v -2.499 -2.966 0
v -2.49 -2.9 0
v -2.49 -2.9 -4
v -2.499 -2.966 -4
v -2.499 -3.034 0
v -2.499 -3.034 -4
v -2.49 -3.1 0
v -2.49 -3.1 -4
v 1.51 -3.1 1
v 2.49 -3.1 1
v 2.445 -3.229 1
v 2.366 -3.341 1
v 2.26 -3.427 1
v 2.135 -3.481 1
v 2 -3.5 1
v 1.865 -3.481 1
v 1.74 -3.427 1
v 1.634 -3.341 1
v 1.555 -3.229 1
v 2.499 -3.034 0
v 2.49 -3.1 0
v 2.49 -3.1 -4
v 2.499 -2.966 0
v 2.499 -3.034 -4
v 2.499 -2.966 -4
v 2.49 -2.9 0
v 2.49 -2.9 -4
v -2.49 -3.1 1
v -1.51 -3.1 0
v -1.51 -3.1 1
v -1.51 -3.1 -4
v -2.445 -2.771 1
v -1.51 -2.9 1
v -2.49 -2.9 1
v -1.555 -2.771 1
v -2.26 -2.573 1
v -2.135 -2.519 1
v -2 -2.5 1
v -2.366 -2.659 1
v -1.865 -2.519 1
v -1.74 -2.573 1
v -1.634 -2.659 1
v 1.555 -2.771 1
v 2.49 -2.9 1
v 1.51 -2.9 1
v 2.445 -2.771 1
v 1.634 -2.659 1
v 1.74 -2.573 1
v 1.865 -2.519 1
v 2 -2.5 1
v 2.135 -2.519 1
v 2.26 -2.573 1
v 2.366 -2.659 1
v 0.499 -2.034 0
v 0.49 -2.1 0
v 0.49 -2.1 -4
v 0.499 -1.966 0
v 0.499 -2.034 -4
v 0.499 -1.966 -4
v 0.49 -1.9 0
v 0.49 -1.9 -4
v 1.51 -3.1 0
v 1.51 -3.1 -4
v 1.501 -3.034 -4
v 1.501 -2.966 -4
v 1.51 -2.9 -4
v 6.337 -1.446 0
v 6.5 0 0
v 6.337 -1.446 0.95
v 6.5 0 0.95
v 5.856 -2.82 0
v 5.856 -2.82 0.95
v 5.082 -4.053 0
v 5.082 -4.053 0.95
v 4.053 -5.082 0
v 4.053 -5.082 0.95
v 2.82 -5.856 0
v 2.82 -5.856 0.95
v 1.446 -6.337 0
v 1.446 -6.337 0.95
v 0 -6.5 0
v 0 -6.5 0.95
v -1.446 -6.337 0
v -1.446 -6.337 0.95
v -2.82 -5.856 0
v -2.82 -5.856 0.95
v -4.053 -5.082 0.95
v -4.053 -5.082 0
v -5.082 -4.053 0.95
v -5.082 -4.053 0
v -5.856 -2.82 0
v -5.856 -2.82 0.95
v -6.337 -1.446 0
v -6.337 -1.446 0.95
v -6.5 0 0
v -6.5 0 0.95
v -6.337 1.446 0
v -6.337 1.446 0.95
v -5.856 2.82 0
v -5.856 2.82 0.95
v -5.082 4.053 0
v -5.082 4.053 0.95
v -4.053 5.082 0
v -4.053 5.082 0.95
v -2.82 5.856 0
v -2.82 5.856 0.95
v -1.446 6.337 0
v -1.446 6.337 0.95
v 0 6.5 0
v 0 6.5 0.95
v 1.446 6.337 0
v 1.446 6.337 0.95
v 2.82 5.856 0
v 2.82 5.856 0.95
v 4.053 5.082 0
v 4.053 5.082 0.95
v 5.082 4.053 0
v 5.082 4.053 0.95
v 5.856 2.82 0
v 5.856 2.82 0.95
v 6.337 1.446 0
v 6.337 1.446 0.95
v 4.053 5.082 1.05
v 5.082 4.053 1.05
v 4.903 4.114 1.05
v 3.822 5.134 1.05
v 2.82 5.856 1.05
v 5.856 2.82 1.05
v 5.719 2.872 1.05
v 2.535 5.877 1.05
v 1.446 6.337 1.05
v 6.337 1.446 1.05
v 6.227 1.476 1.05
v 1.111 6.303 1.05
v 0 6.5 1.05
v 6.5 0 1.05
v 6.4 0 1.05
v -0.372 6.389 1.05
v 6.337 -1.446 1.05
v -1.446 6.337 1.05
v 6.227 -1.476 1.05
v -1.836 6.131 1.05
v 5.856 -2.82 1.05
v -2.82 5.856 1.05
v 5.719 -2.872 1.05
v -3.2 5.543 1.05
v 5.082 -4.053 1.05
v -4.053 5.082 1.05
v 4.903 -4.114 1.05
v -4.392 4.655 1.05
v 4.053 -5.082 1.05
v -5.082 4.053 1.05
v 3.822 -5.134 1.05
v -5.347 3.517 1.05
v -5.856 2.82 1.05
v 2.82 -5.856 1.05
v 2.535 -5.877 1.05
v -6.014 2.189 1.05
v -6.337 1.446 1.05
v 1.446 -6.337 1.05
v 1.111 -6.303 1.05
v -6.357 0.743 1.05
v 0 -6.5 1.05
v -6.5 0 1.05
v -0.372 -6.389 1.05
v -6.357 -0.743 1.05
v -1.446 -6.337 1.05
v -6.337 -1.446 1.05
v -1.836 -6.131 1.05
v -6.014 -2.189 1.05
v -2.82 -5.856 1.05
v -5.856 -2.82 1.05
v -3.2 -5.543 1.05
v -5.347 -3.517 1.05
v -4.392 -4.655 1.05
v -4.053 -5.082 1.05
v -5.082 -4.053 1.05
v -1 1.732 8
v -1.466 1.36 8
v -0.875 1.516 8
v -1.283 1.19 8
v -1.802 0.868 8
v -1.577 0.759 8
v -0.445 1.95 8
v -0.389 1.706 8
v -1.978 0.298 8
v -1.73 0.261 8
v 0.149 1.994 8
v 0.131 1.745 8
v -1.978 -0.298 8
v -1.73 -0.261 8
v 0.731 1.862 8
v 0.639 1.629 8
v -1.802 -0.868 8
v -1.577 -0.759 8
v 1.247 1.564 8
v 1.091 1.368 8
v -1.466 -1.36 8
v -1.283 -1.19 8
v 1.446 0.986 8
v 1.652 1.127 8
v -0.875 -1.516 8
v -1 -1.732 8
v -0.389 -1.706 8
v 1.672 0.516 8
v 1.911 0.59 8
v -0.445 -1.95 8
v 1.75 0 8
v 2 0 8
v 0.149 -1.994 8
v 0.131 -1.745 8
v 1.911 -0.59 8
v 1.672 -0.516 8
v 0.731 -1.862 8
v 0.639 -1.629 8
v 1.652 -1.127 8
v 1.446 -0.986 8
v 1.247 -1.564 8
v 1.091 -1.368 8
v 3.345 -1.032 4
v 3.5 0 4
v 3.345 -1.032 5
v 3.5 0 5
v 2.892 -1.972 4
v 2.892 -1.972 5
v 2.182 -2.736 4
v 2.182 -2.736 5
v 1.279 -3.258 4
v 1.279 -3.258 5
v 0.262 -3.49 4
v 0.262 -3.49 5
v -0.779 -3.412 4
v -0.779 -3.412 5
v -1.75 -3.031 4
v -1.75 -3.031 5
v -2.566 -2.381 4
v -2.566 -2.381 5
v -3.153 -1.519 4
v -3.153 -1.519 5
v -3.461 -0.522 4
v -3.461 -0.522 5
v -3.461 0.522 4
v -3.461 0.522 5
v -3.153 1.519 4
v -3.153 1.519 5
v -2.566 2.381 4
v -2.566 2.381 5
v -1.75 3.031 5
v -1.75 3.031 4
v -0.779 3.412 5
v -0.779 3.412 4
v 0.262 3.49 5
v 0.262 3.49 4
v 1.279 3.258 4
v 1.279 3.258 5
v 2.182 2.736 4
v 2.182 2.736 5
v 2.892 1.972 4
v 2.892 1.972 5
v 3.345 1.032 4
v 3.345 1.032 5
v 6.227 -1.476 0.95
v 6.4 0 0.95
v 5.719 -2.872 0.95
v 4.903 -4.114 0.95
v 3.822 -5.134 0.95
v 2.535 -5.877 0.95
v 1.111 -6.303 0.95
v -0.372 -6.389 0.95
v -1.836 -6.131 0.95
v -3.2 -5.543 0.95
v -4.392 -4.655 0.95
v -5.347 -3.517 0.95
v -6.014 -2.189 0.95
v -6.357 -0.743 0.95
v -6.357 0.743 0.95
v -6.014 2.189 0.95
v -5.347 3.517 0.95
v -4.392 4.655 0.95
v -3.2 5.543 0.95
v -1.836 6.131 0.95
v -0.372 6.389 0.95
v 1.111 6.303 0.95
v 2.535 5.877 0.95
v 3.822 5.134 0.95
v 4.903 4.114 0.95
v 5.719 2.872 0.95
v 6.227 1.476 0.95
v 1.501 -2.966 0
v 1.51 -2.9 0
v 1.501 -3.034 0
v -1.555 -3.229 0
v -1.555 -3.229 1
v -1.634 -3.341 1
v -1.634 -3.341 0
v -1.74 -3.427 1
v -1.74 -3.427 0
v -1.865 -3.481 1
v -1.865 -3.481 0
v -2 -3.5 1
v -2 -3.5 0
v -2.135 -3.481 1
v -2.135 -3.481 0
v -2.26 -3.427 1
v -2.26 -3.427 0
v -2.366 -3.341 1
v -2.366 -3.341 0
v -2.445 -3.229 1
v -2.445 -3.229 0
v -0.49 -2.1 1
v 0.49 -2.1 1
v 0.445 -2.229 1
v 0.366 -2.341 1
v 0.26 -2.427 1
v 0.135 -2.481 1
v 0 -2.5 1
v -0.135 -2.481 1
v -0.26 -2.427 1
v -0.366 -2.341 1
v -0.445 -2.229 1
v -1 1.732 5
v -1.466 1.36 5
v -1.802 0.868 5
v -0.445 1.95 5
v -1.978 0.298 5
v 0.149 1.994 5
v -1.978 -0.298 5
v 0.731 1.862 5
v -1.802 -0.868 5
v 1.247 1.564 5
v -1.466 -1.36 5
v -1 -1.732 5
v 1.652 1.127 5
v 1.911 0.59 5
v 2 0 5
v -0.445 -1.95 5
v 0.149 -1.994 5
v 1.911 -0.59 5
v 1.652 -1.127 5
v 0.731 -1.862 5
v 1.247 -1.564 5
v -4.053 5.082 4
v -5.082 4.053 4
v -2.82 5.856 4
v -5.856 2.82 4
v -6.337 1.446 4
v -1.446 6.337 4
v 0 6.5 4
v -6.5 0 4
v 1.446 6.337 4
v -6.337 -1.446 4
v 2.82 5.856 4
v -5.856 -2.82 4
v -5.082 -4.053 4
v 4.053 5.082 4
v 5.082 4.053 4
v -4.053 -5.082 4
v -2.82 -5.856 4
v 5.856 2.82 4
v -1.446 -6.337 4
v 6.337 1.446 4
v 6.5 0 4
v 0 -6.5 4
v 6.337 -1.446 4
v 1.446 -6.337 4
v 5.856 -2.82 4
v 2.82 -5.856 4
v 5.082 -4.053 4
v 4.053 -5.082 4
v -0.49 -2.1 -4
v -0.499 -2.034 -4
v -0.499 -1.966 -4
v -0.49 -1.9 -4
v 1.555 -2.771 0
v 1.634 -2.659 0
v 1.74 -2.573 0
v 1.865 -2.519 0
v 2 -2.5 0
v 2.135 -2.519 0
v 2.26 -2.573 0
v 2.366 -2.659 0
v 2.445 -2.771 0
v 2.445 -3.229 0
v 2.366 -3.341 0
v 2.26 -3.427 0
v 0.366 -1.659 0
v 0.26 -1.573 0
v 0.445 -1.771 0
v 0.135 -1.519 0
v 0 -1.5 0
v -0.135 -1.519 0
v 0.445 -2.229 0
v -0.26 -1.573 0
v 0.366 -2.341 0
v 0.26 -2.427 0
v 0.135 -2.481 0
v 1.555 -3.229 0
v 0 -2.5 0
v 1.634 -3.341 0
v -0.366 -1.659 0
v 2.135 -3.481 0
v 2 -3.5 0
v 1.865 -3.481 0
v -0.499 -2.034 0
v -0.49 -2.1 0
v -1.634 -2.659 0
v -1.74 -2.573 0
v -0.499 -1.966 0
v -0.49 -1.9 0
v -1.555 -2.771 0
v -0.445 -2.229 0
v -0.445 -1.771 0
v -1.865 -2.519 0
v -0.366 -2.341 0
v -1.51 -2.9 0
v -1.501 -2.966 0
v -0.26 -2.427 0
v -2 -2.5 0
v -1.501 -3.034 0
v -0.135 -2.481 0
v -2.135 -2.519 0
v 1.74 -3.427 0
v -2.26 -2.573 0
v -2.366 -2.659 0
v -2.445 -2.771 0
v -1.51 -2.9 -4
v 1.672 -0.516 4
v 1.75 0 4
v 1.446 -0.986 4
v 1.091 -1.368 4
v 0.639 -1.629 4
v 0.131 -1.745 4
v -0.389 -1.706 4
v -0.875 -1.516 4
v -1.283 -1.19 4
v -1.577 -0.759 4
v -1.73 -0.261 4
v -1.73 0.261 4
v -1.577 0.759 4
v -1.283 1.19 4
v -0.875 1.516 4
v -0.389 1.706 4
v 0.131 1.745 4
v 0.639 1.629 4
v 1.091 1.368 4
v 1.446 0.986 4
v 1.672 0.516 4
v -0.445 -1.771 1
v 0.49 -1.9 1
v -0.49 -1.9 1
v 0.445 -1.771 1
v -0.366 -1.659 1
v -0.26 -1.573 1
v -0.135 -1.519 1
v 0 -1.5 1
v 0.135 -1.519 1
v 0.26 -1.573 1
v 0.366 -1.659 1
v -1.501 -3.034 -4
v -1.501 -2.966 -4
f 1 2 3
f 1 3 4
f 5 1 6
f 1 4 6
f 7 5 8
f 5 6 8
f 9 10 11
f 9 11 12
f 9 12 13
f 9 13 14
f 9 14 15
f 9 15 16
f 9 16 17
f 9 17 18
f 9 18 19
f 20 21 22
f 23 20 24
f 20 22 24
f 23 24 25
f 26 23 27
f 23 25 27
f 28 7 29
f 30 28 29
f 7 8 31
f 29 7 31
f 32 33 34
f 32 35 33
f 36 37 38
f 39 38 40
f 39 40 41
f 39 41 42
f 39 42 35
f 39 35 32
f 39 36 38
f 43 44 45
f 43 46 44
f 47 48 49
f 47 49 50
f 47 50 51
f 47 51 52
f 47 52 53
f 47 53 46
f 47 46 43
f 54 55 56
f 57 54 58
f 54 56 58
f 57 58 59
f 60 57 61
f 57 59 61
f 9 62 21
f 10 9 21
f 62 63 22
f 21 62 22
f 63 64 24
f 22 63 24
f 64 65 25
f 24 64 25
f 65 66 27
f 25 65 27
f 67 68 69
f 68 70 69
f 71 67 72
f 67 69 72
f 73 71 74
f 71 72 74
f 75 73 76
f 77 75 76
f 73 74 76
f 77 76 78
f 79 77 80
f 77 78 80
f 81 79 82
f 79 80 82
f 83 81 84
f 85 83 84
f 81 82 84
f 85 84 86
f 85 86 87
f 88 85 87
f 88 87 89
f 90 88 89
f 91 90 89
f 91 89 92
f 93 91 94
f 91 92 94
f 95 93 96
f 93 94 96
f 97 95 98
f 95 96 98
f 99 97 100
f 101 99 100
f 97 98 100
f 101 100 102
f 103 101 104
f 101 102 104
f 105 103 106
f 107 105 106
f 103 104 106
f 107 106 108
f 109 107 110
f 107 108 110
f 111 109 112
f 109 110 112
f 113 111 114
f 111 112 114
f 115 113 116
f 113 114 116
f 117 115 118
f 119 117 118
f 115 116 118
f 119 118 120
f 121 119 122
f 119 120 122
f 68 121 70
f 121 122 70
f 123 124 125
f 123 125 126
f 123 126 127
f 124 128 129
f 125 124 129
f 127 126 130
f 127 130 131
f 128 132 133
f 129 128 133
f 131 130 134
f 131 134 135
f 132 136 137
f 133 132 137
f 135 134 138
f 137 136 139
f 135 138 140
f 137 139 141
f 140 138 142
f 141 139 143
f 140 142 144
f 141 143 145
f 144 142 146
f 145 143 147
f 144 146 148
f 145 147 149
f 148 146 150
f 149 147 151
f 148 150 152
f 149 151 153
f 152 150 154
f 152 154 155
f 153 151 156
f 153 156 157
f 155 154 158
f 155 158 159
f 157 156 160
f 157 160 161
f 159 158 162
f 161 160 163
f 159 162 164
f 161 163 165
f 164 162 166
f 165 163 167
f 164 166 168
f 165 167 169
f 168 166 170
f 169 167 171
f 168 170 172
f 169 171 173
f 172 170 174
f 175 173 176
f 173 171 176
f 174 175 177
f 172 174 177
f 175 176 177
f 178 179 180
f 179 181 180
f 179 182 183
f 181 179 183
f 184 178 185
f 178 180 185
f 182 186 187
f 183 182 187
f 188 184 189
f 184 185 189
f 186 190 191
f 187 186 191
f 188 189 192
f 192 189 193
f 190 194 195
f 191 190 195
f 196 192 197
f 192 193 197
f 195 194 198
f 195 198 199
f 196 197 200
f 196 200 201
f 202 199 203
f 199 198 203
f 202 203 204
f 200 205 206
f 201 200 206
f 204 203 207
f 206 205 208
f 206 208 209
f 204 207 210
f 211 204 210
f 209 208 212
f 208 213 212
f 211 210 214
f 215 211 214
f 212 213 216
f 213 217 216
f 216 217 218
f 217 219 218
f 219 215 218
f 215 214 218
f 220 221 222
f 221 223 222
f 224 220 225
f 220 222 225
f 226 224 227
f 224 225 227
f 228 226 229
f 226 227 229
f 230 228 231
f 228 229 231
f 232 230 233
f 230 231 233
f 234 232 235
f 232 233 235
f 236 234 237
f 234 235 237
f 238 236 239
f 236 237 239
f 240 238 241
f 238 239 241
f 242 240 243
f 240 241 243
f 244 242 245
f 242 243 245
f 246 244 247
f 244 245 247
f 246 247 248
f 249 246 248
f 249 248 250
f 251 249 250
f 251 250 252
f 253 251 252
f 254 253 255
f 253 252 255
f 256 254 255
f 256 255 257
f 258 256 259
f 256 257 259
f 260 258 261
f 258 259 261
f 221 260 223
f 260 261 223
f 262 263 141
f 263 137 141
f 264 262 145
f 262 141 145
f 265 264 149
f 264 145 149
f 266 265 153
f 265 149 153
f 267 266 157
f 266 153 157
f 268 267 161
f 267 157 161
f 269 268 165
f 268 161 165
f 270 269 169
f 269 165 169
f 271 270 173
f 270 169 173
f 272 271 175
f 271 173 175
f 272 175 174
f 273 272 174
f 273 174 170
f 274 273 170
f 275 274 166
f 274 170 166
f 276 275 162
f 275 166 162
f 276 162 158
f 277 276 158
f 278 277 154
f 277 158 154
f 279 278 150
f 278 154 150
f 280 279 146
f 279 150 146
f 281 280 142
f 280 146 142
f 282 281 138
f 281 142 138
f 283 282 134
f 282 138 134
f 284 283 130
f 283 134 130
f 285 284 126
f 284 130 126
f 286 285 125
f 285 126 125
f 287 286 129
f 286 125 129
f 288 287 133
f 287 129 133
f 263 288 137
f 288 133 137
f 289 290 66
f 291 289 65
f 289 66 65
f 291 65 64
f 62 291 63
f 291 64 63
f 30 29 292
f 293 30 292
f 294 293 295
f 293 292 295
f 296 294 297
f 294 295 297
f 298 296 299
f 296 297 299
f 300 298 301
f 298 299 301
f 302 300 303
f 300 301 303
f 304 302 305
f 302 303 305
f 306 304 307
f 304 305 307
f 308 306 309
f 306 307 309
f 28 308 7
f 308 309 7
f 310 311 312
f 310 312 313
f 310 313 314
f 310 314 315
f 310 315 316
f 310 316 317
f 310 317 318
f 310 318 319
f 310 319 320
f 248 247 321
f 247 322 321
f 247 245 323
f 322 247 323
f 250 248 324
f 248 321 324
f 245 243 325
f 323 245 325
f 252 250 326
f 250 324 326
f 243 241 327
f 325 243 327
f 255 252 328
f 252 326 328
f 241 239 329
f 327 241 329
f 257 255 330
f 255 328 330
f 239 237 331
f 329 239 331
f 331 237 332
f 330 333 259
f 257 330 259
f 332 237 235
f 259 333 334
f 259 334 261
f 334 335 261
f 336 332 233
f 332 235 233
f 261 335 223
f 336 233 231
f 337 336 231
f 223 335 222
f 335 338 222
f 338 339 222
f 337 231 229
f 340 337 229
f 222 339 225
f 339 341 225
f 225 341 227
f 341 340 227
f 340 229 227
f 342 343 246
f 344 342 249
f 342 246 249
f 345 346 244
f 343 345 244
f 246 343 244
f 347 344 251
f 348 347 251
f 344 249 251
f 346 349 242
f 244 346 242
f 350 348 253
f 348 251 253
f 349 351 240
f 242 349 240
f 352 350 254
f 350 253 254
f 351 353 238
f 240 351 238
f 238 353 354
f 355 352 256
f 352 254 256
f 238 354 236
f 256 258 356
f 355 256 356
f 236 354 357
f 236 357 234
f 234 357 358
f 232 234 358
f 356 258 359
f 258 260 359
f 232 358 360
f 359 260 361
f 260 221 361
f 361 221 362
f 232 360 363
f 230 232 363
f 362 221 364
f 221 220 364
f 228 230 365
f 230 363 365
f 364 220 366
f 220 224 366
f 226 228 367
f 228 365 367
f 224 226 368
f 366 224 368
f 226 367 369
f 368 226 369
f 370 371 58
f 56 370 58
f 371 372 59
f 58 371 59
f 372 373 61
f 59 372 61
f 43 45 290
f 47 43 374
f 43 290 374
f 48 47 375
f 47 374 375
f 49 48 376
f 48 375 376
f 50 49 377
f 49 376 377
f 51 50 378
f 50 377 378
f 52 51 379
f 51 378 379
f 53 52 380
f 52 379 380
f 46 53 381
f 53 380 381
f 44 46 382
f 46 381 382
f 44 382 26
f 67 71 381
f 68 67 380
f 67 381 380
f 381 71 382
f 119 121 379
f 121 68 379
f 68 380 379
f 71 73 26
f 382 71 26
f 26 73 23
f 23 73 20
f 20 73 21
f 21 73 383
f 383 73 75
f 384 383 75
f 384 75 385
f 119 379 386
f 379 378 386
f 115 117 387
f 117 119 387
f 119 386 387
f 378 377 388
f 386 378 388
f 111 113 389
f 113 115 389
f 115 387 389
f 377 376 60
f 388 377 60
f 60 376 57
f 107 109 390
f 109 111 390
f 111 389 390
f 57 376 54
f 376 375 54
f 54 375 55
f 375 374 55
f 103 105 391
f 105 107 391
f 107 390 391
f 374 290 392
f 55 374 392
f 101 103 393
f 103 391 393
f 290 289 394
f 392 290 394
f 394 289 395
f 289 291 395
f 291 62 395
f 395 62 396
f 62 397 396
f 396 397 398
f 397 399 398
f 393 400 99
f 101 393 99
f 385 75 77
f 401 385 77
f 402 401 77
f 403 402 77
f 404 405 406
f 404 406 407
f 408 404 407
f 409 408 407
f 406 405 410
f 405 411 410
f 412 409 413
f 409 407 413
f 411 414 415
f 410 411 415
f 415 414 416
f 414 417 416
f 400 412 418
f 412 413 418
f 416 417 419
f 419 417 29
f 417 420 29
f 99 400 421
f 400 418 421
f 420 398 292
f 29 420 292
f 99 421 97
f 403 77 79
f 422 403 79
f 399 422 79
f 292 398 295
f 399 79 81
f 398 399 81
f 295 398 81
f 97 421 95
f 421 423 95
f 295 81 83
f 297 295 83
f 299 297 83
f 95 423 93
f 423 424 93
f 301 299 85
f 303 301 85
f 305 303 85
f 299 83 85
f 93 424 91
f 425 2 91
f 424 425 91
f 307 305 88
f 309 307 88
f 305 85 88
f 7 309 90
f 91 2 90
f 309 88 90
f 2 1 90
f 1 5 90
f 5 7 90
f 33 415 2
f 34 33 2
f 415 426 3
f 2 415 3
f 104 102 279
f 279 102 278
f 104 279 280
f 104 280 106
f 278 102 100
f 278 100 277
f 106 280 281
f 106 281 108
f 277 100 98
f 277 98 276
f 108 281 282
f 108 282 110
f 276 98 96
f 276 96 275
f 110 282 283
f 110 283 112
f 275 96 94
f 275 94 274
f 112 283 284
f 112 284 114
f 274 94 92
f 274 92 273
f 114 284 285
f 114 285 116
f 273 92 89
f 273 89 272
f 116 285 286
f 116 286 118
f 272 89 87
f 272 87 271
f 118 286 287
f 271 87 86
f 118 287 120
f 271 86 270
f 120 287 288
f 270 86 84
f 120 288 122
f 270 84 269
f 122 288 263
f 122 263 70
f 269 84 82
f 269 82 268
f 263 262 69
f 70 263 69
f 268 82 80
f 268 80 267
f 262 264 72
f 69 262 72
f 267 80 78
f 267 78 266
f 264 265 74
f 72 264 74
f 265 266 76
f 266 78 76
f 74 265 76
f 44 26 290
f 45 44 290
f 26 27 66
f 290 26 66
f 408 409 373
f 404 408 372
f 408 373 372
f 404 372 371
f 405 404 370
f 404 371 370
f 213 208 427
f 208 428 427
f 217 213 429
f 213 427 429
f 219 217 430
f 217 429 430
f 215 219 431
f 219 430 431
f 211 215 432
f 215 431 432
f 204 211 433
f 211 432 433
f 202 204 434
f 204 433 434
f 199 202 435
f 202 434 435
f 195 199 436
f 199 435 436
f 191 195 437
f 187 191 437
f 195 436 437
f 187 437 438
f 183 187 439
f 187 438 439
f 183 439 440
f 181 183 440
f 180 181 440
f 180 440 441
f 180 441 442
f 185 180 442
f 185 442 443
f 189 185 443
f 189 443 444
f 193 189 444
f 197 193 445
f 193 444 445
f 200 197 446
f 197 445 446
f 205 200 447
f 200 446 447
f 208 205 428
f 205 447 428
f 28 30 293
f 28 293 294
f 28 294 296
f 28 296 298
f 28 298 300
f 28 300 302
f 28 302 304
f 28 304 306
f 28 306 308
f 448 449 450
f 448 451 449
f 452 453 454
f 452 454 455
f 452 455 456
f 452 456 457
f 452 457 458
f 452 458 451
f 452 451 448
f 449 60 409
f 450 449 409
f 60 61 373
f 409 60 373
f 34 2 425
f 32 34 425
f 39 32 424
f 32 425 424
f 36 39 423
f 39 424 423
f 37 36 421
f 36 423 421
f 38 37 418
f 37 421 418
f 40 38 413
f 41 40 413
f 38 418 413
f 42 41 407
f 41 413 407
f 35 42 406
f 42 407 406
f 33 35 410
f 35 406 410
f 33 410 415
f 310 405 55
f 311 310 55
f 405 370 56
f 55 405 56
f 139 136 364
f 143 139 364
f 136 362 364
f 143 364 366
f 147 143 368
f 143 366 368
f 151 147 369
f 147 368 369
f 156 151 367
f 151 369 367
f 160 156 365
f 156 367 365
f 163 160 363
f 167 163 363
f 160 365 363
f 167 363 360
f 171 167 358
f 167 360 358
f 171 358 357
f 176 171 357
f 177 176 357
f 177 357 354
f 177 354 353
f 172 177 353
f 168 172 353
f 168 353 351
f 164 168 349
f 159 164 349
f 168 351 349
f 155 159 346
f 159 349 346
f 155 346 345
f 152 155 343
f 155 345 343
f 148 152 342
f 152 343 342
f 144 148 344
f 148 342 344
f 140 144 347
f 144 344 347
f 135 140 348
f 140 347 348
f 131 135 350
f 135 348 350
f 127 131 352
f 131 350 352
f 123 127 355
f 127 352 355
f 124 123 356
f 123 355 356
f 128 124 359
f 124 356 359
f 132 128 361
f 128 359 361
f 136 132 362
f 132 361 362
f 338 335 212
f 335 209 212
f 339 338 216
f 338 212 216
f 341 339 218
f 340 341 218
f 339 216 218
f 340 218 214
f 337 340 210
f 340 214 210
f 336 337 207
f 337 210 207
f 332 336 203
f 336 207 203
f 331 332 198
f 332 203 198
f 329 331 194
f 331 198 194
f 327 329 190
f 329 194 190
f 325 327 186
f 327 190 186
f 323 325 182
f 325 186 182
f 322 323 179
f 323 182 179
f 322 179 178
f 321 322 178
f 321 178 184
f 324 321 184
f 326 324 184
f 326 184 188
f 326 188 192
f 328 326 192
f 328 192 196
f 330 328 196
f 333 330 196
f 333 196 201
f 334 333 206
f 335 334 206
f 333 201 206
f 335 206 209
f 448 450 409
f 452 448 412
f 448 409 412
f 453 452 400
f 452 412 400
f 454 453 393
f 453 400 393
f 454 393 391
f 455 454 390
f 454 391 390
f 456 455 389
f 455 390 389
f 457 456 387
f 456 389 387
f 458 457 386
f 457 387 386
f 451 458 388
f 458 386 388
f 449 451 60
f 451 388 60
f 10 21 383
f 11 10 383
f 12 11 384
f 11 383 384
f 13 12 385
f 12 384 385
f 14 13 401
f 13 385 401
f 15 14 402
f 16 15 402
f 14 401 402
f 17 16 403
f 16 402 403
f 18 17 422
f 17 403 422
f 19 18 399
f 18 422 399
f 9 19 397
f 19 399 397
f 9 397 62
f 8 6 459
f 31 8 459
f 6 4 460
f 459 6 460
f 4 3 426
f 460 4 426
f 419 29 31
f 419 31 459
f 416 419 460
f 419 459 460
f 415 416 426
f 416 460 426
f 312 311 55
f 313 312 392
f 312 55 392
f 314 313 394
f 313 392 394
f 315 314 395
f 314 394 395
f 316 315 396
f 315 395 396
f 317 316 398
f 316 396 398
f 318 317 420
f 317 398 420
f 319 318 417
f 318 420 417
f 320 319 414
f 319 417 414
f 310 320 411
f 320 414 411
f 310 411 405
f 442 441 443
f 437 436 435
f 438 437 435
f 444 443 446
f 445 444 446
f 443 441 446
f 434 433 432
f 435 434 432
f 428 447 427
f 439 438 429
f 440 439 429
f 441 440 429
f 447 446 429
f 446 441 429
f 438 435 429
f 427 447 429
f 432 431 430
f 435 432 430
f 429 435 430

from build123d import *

# Parameters (mm, degrees)
CROQUIS3_R              = 0.5
CORTAR_EXTRUIR1_DEPTH   = 1
SALIENTE_EXTRUIR3_START = 5
SALIENTE_EXTRUIR3_DEPTH = 5


with BuildPart() as part:
    # Croquis2 → Revolución1 (revolve)
    with BuildSketch(Plane(origin=(0, 0, 0), x_dir=(0, 0, -1), z_dir=(1, 0, 0)), mode=Mode.PRIVATE) as revoluci_n1_sk:
        Polygon((0, 0), (0, 6.5), (-0.95, 6.5), (-0.95, 6.4), (-1.05, 6.4), (-1.05, 6.5), (-4, 6.5), (-4, 3.5), (-5, 3.5), (-5, 2), (-8, 2), (-8, 1.75), (-4, 1.75), (-4, 0), align=None)
    revolve(revoluci_n1_sk.sketch.rotate(Axis((0, 0, 4), (0, 0, -1)), 90), axis=Axis((0, 0, 4), (0, 0, -1)))

    # Croquis3 → Cortar-Extruir1 (cut)
    with BuildSketch(Plane(origin=(0, 0, 0), x_dir=(-1, 0, 0), z_dir=(0, 0, -1))):
        with Locations((-2, -3)):
            Circle(CROQUIS3_R)
        with Locations((2, -3)):
            Circle(CROQUIS3_R)
        with Locations((0, -2)):
            Circle(CROQUIS3_R)
    extrude(amount=-CORTAR_EXTRUIR1_DEPTH, mode=Mode.SUBTRACT)

    # Croquis5 → Saliente-Extruir3 (add)
    with BuildSketch(Plane(origin=(0, 0, 1), x_dir=(-1, 0, 0), z_dir=(0, 0, -1)).offset(SALIENTE_EXTRUIR3_START)):
        with BuildLine():
            Line((-0.489897949, -1.9), (0.489897949, -1.9))
            ThreePointArc((0.489897949, -1.9), (0.5, -2), (0.489897949, -2.1))
            Line((0.489897949, -2.1), (-0.489897949, -2.1))
            ThreePointArc((-0.489897949, -2.1), (-0.5, -2), (-0.489897949, -1.9))
        make_face()
        with BuildLine():
            Line((1.510102051, -2.9), (2.489897949, -2.9))
            ThreePointArc((2.489897949, -2.9), (2.5, -3), (2.489897949, -3.1))
            Line((2.489897949, -3.1), (1.510102051, -3.1))
            ThreePointArc((1.510102051, -3.1), (1.5, -3), (1.510102051, -2.9))
        make_face()
        with BuildLine():
            Line((-2.489897949, -2.9), (-1.510102051, -2.9))
            ThreePointArc((-1.510102051, -2.9), (-1.5, -3), (-1.510102051, -3.1))
            Line((-1.510102051, -3.1), (-2.489897949, -3.1))
            ThreePointArc((-2.489897949, -3.1), (-2.5, -3), (-2.489897949, -2.9))
        make_face()
    extrude(amount=-SALIENTE_EXTRUIR3_DEPTH)


solid = part.part
